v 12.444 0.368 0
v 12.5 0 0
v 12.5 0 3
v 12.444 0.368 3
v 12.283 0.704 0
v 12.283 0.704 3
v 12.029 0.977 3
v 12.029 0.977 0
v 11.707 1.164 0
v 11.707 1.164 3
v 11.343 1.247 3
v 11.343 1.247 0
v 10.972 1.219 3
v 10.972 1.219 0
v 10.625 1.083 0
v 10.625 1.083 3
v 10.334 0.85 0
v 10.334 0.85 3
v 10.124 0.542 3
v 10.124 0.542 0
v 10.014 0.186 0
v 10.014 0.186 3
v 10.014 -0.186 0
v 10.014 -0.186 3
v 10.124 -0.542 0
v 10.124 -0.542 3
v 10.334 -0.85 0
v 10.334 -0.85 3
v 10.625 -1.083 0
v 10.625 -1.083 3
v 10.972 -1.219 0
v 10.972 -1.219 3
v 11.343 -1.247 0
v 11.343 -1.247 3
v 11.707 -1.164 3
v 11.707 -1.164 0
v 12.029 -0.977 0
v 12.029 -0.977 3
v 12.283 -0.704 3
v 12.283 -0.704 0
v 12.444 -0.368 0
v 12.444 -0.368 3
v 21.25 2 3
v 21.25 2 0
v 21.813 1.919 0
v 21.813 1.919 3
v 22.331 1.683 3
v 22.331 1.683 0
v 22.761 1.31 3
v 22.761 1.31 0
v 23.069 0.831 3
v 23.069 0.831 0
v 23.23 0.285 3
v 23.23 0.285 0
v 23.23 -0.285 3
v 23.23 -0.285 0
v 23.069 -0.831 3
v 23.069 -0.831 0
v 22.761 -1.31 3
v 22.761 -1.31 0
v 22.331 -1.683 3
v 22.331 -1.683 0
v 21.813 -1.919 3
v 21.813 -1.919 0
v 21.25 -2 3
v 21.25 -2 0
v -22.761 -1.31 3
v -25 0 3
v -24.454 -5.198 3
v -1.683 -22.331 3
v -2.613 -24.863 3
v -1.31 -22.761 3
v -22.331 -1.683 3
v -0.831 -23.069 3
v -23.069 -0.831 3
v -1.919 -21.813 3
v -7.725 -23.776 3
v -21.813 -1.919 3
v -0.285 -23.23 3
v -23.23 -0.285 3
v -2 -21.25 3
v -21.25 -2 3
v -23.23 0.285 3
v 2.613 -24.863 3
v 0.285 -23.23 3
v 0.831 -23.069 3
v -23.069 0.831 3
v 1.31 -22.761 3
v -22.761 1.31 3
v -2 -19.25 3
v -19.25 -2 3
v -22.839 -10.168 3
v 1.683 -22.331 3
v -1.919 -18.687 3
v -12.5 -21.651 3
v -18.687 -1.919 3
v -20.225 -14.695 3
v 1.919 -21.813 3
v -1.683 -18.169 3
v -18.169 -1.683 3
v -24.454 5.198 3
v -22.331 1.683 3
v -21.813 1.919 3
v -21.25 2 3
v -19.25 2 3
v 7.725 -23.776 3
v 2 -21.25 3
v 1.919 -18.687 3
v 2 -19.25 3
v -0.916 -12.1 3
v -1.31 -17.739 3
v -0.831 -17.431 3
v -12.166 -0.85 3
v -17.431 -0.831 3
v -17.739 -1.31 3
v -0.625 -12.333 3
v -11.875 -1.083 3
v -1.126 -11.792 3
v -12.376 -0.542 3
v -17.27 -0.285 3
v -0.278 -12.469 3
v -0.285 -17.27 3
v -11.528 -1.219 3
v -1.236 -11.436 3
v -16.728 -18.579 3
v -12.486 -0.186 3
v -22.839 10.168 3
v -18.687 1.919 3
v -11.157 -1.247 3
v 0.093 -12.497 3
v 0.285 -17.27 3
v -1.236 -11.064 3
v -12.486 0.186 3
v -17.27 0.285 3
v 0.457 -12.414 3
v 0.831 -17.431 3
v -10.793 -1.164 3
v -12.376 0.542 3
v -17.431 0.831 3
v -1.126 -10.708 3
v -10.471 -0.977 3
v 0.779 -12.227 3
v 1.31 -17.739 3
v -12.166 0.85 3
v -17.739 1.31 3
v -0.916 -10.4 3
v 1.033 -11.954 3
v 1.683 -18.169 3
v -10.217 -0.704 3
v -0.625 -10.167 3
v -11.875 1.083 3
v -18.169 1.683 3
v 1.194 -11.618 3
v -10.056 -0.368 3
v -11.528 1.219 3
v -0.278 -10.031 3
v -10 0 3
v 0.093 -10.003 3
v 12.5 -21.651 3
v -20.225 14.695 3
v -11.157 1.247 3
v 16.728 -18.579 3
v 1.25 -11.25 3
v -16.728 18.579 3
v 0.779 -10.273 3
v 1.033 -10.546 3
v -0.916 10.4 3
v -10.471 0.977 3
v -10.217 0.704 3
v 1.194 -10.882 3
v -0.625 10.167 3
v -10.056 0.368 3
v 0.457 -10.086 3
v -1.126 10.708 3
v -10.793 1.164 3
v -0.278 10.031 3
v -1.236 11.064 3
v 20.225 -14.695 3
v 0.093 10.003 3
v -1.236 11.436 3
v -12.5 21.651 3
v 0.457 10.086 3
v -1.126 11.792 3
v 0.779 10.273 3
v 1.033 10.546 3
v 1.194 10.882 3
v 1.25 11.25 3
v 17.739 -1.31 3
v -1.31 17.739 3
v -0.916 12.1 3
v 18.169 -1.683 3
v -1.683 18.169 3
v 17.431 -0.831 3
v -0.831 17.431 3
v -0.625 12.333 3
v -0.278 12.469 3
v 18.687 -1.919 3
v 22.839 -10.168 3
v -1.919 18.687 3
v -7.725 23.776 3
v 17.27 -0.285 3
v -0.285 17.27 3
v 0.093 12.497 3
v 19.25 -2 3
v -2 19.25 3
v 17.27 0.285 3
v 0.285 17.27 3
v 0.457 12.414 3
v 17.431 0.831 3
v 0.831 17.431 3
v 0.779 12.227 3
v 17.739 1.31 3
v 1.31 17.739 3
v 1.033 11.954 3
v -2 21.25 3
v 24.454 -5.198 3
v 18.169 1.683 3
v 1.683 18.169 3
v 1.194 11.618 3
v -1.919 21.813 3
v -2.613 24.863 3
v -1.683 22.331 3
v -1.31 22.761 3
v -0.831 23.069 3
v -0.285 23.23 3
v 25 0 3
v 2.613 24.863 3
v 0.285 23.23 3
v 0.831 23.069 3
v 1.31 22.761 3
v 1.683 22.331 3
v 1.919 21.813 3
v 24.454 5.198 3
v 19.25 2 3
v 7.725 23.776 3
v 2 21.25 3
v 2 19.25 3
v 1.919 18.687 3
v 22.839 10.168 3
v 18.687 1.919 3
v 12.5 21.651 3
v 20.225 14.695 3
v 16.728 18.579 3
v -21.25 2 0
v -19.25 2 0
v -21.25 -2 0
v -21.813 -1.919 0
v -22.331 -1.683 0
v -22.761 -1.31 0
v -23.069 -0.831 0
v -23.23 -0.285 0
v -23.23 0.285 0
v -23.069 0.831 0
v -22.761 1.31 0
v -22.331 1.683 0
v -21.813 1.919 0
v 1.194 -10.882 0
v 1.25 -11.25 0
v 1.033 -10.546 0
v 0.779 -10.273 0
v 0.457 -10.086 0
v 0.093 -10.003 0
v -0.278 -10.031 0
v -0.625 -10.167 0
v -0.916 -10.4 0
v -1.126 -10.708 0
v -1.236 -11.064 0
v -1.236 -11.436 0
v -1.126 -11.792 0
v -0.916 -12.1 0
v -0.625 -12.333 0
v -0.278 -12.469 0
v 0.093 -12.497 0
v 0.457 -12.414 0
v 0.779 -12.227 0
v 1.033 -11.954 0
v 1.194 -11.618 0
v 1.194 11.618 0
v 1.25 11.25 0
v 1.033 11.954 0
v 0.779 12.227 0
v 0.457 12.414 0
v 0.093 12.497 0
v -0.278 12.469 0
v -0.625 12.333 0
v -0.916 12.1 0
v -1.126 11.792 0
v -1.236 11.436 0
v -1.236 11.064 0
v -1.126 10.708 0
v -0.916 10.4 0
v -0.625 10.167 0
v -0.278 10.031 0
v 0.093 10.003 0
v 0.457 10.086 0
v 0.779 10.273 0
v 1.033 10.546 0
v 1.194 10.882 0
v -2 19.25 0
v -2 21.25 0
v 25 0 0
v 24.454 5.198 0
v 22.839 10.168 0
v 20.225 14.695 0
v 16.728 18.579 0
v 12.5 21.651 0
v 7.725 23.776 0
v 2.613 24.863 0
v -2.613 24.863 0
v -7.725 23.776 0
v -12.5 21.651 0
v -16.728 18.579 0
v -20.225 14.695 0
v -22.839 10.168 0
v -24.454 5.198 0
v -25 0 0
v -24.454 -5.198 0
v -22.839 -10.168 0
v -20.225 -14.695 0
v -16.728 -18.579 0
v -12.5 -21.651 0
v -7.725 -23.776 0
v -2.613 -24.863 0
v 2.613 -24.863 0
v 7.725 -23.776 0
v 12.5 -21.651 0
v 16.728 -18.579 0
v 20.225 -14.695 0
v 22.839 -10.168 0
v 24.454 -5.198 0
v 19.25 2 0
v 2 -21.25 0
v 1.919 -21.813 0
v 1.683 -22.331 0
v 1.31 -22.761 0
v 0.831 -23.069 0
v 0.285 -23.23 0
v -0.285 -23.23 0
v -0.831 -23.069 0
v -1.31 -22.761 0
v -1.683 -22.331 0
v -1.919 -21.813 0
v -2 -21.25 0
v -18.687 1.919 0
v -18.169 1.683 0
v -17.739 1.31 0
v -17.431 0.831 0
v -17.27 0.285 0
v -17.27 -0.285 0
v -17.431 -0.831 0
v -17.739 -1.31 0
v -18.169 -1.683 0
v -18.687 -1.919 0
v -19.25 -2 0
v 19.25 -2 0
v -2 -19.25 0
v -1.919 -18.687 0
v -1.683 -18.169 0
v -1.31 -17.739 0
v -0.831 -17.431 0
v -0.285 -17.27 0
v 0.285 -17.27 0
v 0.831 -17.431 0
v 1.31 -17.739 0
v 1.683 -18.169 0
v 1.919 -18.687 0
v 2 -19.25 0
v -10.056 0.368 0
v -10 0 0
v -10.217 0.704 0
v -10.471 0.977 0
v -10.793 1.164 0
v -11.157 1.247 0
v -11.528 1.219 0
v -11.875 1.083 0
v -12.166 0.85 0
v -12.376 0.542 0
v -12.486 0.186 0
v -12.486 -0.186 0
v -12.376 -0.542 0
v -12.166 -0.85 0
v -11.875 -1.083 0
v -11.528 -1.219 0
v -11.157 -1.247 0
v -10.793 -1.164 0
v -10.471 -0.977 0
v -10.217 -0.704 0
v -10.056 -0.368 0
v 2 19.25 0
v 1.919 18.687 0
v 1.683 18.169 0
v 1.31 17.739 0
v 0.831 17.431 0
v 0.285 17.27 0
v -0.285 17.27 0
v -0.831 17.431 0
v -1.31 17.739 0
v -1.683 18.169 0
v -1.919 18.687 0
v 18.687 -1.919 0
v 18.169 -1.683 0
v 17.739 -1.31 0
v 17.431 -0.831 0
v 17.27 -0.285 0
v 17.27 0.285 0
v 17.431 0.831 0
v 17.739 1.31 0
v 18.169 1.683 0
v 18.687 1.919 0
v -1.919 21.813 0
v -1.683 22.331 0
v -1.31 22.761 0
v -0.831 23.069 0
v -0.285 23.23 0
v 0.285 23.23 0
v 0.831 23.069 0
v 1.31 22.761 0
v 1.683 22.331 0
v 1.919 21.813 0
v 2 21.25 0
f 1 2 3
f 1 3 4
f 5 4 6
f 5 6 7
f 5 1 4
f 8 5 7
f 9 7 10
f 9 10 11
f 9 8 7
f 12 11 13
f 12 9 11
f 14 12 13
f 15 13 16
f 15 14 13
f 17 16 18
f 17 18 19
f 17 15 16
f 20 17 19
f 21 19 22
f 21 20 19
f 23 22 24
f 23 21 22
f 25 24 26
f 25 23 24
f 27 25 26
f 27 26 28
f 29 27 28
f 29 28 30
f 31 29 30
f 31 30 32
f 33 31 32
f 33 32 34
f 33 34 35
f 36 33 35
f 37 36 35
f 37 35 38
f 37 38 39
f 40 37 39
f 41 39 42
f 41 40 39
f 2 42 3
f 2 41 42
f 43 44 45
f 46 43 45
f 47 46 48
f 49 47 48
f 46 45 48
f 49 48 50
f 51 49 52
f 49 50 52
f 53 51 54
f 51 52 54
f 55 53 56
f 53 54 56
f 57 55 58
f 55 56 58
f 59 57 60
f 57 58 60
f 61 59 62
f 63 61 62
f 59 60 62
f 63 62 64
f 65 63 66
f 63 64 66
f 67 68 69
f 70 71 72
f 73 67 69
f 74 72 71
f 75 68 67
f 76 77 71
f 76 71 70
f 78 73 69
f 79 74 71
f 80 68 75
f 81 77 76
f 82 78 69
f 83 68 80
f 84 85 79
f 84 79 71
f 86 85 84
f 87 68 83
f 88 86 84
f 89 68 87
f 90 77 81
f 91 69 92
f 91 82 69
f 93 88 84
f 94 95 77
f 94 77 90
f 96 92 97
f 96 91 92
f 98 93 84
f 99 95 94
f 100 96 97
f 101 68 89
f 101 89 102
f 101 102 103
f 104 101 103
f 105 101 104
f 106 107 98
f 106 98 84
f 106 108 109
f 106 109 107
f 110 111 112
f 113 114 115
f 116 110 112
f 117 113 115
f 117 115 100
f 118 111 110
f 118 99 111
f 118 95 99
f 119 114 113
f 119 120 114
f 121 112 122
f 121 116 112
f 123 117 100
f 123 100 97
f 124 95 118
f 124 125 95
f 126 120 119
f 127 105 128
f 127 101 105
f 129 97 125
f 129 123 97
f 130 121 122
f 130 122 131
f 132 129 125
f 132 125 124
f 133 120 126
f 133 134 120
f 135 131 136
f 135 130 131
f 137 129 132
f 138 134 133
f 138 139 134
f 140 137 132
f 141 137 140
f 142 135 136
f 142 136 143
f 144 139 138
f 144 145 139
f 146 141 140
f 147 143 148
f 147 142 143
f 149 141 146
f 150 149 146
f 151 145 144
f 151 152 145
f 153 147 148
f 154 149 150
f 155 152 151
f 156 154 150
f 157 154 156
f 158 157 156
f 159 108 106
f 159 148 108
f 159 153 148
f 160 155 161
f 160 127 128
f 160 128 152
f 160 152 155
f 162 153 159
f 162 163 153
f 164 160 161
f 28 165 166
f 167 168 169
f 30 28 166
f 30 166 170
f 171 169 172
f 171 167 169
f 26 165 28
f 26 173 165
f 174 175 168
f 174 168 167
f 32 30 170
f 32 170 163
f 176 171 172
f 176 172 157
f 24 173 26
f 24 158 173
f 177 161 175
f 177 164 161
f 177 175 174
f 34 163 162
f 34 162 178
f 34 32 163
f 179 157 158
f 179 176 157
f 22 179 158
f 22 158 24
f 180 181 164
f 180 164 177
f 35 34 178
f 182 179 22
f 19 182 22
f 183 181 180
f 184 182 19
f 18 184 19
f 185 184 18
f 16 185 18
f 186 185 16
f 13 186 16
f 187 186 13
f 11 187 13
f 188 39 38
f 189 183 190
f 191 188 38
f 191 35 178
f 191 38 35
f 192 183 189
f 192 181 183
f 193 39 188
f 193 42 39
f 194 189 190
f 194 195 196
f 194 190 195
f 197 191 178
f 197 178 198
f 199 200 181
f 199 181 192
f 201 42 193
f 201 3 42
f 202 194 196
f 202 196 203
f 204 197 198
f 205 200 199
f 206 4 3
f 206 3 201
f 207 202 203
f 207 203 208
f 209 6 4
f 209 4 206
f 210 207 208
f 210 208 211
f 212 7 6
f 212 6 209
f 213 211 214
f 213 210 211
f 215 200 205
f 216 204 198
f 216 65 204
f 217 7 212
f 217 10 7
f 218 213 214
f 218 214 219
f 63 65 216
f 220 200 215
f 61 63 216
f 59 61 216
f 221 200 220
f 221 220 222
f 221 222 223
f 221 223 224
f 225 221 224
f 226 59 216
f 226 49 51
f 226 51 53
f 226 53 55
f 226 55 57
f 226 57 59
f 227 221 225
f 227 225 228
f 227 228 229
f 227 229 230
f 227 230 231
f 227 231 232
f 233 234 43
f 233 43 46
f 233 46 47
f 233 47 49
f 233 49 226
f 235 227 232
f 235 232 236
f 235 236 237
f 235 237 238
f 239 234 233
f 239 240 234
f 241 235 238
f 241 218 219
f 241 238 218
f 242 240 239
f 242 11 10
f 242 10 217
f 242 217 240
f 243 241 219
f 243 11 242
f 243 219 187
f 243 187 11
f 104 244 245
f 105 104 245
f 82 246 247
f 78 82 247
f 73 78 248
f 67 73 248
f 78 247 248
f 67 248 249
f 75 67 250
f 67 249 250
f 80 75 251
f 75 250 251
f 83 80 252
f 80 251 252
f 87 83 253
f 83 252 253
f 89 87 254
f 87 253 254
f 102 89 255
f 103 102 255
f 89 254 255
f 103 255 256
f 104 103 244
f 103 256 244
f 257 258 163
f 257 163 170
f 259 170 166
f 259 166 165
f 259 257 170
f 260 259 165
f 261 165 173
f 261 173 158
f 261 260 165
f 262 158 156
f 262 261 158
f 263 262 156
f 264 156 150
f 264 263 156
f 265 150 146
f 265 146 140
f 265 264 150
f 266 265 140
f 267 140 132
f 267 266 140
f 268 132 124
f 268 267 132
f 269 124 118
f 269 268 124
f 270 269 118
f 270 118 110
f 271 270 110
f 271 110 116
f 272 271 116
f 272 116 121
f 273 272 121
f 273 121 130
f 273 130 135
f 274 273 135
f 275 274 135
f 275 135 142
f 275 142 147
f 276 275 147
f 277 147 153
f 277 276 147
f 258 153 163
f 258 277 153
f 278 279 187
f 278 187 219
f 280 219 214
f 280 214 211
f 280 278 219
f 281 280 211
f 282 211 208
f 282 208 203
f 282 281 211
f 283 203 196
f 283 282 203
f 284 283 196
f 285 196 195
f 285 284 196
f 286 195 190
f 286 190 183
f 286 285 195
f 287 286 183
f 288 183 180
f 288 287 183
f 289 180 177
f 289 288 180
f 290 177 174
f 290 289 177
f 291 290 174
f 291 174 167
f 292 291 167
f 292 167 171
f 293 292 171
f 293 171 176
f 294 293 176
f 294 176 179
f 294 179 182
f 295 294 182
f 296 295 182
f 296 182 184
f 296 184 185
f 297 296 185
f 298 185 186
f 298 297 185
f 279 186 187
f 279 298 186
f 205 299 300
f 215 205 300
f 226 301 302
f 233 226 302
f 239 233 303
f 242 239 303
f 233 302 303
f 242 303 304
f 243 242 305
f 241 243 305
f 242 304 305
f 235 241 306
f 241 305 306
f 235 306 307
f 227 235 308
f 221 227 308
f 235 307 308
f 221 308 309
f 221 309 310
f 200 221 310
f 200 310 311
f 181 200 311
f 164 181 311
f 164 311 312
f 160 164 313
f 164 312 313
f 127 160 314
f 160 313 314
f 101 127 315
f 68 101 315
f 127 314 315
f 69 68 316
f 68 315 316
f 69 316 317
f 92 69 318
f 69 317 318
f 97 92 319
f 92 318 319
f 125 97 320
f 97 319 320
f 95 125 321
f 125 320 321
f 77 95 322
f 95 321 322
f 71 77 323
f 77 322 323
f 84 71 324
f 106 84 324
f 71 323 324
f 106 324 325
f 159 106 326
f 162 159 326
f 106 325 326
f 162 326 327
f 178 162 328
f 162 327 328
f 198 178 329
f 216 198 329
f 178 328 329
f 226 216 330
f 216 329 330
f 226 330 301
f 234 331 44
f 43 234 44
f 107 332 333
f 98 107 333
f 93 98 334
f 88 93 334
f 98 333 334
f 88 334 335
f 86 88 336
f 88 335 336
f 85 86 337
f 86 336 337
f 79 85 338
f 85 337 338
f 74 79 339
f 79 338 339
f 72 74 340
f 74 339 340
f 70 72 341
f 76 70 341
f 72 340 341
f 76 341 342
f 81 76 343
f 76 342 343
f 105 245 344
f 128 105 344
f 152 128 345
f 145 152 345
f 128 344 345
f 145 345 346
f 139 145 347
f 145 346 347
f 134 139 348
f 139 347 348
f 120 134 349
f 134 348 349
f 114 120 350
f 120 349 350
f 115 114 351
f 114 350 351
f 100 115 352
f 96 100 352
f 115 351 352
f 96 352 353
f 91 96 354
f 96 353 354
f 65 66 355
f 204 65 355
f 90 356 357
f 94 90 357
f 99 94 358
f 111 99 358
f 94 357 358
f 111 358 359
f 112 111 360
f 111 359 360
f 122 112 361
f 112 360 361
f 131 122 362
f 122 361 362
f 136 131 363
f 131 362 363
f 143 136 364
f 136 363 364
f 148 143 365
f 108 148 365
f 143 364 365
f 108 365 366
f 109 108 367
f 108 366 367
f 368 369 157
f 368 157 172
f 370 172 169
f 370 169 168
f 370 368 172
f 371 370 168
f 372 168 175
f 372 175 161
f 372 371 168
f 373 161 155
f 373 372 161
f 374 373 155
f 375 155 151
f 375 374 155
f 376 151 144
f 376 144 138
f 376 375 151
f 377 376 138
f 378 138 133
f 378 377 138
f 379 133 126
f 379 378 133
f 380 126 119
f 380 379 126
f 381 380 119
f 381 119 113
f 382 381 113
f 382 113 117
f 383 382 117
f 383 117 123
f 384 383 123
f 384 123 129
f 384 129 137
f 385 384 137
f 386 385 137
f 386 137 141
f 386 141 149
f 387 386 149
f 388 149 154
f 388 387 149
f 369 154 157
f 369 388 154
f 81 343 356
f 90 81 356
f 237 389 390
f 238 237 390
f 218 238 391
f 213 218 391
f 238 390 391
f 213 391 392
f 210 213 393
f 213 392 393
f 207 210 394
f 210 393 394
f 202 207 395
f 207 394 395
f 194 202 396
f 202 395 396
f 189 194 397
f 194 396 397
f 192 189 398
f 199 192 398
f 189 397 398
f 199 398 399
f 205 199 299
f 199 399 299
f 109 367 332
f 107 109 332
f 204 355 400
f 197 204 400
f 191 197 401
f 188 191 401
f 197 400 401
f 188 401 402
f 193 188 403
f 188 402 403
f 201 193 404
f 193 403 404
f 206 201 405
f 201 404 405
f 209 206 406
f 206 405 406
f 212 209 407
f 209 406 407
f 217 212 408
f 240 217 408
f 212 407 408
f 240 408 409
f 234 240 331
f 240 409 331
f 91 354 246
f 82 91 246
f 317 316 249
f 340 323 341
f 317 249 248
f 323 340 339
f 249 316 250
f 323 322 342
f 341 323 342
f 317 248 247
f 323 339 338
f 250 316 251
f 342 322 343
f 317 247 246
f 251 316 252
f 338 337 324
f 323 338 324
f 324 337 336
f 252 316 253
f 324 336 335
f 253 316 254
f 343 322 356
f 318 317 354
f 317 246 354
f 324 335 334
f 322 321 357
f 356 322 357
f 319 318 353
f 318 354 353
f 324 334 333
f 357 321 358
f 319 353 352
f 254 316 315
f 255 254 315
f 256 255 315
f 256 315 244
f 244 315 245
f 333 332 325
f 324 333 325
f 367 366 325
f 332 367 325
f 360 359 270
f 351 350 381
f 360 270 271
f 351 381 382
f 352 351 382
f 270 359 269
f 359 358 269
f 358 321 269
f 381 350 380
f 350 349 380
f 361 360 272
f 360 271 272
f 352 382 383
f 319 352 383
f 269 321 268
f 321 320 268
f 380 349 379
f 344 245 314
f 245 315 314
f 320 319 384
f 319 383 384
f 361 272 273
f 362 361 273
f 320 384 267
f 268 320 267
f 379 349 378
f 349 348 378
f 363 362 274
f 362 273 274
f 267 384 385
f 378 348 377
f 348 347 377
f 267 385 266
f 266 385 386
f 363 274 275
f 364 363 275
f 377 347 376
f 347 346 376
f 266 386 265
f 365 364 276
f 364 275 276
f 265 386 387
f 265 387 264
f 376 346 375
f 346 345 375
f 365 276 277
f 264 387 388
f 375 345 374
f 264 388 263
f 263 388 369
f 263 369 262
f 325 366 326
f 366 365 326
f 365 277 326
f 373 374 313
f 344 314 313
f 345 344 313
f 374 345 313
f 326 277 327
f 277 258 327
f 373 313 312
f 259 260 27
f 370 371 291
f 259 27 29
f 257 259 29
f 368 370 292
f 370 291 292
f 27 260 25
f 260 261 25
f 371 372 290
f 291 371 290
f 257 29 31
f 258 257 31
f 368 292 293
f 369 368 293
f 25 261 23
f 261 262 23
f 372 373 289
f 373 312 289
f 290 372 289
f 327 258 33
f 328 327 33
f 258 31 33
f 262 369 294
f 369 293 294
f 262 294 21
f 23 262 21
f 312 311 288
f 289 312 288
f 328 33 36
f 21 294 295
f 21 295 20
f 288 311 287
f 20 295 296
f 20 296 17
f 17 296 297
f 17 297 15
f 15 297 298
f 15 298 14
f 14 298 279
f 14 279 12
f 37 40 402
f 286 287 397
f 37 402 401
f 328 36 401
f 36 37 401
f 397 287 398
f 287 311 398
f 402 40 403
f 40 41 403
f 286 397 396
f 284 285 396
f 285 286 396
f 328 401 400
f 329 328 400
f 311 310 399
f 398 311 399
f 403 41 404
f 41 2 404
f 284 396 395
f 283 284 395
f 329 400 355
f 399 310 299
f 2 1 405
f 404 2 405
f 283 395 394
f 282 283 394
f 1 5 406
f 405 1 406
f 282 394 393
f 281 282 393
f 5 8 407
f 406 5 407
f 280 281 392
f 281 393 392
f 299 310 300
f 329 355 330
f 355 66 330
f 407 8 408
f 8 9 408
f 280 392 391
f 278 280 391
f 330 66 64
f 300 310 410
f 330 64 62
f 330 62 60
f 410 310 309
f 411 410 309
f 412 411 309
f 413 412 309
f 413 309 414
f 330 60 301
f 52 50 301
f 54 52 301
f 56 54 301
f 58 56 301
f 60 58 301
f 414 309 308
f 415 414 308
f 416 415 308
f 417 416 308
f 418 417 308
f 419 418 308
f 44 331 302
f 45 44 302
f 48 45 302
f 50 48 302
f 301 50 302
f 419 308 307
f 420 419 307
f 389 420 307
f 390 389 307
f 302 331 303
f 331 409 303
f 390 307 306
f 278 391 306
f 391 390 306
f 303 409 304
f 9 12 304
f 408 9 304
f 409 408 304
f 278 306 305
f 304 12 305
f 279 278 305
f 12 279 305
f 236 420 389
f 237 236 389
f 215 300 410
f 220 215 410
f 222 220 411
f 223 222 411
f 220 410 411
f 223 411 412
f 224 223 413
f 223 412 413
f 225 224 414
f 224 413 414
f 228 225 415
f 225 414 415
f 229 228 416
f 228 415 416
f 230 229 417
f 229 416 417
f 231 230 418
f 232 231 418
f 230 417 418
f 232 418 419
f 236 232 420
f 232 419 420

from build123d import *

# Parameters (mm, degrees)
F0_R     = 25
F0_R_2   = 1.25
F1_DEPTH = 3


with BuildPart() as f1:
    # F0 (on Top) → F1 (new body)
    with BuildSketch(Plane.XY):
        Circle(F0_R)
        with BuildLine():
            Line((-2, -21.25), (-2, -19.25))
            ThreePointArc((-2, -19.25), (0, -17.25), (2, -19.25))
            Line((2, -19.25), (2, -21.25))
            ThreePointArc((2, -21.25), (0, -23.25), (-2, -21.25))
        make_face(mode=Mode.SUBTRACT)
        with Locations((0, -11.25)):
            Circle(F0_R_2, mode=Mode.SUBTRACT)
        with BuildLine():
            Line((-19.25, -2), (-21.25, -2))
            ThreePointArc((-21.25, -2), (-23.25, 0), (-21.25, 2))
            Line((-21.25, 2), (-19.25, 2))
            ThreePointArc((-19.25, 2), (-17.25, 0), (-19.25, -2))
        make_face(mode=Mode.SUBTRACT)
        with Locations((-11.25, 0)):
            Circle(F0_R_2, mode=Mode.SUBTRACT)
        with Locations((11.25, 0)):
            Circle(F0_R_2, mode=Mode.SUBTRACT)
        with Locations((0, 11.25)):
            Circle(F0_R_2, mode=Mode.SUBTRACT)
        with BuildLine():
            ThreePointArc((21.25, 2), (23.25, 0), (21.25, -2))
            Line((21.25, -2), (19.25, -2))
            ThreePointArc((19.25, -2), (17.25, 0), (19.25, 2))
            Line((19.25, 2), (21.25, 2))
        make_face(mode=Mode.SUBTRACT)
        with BuildLine():
            Line((2, 21.25), (2, 19.25))
            ThreePointArc((2, 19.25), (0, 17.25), (-2, 19.25))
            Line((-2, 19.25), (-2, 21.25))
            ThreePointArc((-2, 21.25), (0, 23.25), (2, 21.25))
        make_face(mode=Mode.SUBTRACT)
    extrude(amount=F1_DEPTH)


solid = f1.part
